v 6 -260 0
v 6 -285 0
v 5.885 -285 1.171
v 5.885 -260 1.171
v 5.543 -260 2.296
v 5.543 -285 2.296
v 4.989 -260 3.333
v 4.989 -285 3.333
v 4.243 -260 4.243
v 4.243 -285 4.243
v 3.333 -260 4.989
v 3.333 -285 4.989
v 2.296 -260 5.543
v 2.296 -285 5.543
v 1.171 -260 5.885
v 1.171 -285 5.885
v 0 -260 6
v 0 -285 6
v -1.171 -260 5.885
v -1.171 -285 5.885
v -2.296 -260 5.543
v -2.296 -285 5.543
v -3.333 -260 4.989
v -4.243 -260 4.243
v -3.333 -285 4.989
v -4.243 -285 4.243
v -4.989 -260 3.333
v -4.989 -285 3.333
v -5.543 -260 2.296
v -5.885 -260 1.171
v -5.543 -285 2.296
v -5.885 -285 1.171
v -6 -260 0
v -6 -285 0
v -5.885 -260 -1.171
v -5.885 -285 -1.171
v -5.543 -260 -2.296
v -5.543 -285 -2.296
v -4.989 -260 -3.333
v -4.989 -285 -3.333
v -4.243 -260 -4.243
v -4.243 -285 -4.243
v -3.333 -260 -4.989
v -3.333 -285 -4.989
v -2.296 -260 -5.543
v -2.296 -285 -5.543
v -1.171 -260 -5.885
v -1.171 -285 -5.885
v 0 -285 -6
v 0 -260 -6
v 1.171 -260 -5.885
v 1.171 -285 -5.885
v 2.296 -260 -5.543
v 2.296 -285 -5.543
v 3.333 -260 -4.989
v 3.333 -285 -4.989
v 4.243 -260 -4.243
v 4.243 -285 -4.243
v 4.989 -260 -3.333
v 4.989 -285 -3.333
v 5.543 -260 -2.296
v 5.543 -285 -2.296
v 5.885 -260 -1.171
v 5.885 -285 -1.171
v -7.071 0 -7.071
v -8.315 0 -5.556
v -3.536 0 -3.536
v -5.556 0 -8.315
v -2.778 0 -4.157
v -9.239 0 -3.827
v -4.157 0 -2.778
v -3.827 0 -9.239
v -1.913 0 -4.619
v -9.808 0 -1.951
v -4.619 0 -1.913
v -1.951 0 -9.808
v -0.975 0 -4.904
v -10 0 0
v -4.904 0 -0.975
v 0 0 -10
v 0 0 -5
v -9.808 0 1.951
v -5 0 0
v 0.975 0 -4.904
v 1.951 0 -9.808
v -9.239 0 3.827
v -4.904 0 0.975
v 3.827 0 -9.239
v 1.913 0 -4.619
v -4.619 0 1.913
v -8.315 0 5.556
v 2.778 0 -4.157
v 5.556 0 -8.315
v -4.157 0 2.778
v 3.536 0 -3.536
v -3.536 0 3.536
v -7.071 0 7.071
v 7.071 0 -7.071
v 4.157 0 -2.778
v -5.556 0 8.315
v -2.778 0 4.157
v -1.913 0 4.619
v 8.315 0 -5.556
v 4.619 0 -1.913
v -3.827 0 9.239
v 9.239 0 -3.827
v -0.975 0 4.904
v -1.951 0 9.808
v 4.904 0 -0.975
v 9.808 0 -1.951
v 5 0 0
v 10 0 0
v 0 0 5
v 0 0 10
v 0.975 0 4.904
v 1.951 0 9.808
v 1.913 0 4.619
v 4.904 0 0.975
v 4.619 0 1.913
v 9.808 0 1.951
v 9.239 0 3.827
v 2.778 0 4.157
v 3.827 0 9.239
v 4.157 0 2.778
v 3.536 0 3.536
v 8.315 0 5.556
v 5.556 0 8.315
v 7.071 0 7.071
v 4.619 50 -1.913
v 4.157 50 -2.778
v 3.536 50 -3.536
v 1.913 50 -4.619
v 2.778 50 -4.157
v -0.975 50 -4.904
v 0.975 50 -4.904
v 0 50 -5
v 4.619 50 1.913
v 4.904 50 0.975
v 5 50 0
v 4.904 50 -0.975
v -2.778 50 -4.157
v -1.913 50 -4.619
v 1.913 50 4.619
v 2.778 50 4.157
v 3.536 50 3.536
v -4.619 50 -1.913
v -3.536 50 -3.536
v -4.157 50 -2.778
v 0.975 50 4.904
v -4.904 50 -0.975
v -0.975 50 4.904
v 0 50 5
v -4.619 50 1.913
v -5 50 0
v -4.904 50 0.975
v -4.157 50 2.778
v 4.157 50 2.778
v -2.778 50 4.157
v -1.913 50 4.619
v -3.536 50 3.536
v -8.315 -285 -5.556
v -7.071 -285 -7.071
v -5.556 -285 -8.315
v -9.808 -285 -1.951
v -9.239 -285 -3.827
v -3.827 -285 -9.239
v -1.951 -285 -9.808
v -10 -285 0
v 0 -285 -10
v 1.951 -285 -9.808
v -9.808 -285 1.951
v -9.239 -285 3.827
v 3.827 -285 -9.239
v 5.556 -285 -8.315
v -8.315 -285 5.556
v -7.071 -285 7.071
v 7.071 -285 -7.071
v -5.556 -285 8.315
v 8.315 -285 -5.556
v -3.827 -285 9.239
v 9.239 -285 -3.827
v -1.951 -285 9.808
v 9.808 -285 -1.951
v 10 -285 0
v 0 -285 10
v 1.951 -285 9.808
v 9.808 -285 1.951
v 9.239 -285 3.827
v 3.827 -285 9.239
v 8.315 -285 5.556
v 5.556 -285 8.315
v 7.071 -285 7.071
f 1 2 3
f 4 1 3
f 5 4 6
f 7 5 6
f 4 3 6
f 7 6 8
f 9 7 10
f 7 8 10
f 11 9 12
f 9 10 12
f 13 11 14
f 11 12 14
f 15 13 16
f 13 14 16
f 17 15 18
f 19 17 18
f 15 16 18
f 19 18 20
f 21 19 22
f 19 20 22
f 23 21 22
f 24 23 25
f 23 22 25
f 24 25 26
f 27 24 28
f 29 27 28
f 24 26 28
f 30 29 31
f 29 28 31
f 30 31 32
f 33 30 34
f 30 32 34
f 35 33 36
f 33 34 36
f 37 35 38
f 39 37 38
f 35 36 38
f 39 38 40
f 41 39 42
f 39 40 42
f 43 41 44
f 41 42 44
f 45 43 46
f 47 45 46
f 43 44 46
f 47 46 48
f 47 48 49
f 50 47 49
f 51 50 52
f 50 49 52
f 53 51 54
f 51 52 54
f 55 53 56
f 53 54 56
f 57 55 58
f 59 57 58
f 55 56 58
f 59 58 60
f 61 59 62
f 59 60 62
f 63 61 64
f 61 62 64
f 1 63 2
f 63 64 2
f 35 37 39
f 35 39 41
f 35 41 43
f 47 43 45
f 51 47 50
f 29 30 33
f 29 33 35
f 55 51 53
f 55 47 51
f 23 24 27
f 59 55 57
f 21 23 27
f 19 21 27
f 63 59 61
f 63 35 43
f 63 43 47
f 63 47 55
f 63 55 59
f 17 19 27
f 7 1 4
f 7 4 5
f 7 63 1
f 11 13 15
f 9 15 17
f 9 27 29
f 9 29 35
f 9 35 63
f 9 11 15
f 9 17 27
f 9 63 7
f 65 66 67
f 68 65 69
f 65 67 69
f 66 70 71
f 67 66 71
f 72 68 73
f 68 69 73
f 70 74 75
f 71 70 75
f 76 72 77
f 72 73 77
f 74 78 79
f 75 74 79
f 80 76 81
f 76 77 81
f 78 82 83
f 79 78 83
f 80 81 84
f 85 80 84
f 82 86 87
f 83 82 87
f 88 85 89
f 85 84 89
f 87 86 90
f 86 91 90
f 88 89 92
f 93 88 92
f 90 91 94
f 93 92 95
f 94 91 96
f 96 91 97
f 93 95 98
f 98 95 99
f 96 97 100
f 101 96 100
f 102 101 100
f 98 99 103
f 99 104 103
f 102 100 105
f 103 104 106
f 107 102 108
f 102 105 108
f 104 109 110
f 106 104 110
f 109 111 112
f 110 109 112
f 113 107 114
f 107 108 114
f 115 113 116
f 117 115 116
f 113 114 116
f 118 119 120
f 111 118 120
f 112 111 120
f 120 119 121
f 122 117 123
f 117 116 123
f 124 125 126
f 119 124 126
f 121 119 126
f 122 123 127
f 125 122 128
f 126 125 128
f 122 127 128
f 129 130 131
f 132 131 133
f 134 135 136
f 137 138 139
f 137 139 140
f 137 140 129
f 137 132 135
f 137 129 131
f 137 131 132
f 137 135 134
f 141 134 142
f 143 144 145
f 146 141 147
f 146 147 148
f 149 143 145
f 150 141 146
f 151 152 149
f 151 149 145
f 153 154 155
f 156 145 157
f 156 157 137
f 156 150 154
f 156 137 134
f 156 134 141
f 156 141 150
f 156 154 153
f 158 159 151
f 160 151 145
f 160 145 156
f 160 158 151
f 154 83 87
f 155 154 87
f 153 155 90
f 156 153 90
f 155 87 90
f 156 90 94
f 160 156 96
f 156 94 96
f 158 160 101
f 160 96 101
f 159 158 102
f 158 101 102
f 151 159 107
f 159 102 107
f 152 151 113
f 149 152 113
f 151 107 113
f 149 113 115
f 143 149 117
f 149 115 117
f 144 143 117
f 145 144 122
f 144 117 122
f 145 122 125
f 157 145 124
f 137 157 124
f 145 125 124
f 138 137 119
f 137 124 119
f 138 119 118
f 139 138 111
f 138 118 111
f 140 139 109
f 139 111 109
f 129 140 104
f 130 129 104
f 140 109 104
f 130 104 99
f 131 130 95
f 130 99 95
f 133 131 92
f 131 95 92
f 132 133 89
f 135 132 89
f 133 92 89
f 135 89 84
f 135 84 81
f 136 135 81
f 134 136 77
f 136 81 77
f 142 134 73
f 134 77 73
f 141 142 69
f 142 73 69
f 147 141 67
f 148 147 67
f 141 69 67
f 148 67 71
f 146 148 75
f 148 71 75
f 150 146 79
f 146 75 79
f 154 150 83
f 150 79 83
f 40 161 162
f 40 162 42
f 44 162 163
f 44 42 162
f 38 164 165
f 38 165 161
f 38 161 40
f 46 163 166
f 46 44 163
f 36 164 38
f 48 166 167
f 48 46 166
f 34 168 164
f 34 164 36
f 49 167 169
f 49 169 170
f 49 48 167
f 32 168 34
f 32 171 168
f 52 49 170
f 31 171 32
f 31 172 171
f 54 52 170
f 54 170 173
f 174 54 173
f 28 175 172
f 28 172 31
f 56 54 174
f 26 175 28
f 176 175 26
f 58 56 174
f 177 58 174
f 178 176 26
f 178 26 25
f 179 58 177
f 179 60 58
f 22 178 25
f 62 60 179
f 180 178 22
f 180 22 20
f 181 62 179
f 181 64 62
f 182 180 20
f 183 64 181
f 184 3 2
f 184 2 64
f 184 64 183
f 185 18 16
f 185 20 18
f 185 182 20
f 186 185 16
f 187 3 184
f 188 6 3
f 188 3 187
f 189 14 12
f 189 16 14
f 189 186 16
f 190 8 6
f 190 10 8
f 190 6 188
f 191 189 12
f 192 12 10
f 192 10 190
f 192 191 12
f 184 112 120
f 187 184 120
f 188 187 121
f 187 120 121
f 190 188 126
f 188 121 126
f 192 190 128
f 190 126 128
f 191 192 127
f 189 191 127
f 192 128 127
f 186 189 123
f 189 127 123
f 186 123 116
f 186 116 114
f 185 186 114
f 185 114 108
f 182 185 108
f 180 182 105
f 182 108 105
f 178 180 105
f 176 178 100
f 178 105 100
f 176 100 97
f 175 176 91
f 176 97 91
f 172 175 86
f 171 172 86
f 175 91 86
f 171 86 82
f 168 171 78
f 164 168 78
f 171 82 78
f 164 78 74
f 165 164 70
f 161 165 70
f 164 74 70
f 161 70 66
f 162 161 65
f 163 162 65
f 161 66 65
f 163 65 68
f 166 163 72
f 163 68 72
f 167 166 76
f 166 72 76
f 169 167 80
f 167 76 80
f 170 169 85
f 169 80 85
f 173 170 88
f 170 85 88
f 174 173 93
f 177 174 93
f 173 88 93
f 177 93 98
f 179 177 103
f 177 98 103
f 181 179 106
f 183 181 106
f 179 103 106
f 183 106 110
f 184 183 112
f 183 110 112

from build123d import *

# Parameters (mm, degrees)
F0_R     = 10
F1_DEPTH = 285
F2_R     = 6
F3_DEPTH = 25
F4_R     = 5
F5_DEPTH = 50


with BuildPart() as f1:
    # F0 (on Front) → F1 (new body)
    with BuildSketch(Plane.XZ):
        Circle(F0_R)
    extrude(amount=F1_DEPTH)

    # F2 (on face) → F3 (cut)
    with BuildSketch(Plane.XZ.offset(285)):
        Circle(F2_R)
    extrude(amount=-F3_DEPTH, mode=Mode.SUBTRACT)

    # F4 (on face) → F5 (join)
    with BuildSketch(Plane(origin=(0, 0, 0), x_dir=(-1, 0, 0), z_dir=(0, 1, 0))):
        Circle(F4_R)
    extrude(amount=F5_DEPTH)


solid = f1.part
